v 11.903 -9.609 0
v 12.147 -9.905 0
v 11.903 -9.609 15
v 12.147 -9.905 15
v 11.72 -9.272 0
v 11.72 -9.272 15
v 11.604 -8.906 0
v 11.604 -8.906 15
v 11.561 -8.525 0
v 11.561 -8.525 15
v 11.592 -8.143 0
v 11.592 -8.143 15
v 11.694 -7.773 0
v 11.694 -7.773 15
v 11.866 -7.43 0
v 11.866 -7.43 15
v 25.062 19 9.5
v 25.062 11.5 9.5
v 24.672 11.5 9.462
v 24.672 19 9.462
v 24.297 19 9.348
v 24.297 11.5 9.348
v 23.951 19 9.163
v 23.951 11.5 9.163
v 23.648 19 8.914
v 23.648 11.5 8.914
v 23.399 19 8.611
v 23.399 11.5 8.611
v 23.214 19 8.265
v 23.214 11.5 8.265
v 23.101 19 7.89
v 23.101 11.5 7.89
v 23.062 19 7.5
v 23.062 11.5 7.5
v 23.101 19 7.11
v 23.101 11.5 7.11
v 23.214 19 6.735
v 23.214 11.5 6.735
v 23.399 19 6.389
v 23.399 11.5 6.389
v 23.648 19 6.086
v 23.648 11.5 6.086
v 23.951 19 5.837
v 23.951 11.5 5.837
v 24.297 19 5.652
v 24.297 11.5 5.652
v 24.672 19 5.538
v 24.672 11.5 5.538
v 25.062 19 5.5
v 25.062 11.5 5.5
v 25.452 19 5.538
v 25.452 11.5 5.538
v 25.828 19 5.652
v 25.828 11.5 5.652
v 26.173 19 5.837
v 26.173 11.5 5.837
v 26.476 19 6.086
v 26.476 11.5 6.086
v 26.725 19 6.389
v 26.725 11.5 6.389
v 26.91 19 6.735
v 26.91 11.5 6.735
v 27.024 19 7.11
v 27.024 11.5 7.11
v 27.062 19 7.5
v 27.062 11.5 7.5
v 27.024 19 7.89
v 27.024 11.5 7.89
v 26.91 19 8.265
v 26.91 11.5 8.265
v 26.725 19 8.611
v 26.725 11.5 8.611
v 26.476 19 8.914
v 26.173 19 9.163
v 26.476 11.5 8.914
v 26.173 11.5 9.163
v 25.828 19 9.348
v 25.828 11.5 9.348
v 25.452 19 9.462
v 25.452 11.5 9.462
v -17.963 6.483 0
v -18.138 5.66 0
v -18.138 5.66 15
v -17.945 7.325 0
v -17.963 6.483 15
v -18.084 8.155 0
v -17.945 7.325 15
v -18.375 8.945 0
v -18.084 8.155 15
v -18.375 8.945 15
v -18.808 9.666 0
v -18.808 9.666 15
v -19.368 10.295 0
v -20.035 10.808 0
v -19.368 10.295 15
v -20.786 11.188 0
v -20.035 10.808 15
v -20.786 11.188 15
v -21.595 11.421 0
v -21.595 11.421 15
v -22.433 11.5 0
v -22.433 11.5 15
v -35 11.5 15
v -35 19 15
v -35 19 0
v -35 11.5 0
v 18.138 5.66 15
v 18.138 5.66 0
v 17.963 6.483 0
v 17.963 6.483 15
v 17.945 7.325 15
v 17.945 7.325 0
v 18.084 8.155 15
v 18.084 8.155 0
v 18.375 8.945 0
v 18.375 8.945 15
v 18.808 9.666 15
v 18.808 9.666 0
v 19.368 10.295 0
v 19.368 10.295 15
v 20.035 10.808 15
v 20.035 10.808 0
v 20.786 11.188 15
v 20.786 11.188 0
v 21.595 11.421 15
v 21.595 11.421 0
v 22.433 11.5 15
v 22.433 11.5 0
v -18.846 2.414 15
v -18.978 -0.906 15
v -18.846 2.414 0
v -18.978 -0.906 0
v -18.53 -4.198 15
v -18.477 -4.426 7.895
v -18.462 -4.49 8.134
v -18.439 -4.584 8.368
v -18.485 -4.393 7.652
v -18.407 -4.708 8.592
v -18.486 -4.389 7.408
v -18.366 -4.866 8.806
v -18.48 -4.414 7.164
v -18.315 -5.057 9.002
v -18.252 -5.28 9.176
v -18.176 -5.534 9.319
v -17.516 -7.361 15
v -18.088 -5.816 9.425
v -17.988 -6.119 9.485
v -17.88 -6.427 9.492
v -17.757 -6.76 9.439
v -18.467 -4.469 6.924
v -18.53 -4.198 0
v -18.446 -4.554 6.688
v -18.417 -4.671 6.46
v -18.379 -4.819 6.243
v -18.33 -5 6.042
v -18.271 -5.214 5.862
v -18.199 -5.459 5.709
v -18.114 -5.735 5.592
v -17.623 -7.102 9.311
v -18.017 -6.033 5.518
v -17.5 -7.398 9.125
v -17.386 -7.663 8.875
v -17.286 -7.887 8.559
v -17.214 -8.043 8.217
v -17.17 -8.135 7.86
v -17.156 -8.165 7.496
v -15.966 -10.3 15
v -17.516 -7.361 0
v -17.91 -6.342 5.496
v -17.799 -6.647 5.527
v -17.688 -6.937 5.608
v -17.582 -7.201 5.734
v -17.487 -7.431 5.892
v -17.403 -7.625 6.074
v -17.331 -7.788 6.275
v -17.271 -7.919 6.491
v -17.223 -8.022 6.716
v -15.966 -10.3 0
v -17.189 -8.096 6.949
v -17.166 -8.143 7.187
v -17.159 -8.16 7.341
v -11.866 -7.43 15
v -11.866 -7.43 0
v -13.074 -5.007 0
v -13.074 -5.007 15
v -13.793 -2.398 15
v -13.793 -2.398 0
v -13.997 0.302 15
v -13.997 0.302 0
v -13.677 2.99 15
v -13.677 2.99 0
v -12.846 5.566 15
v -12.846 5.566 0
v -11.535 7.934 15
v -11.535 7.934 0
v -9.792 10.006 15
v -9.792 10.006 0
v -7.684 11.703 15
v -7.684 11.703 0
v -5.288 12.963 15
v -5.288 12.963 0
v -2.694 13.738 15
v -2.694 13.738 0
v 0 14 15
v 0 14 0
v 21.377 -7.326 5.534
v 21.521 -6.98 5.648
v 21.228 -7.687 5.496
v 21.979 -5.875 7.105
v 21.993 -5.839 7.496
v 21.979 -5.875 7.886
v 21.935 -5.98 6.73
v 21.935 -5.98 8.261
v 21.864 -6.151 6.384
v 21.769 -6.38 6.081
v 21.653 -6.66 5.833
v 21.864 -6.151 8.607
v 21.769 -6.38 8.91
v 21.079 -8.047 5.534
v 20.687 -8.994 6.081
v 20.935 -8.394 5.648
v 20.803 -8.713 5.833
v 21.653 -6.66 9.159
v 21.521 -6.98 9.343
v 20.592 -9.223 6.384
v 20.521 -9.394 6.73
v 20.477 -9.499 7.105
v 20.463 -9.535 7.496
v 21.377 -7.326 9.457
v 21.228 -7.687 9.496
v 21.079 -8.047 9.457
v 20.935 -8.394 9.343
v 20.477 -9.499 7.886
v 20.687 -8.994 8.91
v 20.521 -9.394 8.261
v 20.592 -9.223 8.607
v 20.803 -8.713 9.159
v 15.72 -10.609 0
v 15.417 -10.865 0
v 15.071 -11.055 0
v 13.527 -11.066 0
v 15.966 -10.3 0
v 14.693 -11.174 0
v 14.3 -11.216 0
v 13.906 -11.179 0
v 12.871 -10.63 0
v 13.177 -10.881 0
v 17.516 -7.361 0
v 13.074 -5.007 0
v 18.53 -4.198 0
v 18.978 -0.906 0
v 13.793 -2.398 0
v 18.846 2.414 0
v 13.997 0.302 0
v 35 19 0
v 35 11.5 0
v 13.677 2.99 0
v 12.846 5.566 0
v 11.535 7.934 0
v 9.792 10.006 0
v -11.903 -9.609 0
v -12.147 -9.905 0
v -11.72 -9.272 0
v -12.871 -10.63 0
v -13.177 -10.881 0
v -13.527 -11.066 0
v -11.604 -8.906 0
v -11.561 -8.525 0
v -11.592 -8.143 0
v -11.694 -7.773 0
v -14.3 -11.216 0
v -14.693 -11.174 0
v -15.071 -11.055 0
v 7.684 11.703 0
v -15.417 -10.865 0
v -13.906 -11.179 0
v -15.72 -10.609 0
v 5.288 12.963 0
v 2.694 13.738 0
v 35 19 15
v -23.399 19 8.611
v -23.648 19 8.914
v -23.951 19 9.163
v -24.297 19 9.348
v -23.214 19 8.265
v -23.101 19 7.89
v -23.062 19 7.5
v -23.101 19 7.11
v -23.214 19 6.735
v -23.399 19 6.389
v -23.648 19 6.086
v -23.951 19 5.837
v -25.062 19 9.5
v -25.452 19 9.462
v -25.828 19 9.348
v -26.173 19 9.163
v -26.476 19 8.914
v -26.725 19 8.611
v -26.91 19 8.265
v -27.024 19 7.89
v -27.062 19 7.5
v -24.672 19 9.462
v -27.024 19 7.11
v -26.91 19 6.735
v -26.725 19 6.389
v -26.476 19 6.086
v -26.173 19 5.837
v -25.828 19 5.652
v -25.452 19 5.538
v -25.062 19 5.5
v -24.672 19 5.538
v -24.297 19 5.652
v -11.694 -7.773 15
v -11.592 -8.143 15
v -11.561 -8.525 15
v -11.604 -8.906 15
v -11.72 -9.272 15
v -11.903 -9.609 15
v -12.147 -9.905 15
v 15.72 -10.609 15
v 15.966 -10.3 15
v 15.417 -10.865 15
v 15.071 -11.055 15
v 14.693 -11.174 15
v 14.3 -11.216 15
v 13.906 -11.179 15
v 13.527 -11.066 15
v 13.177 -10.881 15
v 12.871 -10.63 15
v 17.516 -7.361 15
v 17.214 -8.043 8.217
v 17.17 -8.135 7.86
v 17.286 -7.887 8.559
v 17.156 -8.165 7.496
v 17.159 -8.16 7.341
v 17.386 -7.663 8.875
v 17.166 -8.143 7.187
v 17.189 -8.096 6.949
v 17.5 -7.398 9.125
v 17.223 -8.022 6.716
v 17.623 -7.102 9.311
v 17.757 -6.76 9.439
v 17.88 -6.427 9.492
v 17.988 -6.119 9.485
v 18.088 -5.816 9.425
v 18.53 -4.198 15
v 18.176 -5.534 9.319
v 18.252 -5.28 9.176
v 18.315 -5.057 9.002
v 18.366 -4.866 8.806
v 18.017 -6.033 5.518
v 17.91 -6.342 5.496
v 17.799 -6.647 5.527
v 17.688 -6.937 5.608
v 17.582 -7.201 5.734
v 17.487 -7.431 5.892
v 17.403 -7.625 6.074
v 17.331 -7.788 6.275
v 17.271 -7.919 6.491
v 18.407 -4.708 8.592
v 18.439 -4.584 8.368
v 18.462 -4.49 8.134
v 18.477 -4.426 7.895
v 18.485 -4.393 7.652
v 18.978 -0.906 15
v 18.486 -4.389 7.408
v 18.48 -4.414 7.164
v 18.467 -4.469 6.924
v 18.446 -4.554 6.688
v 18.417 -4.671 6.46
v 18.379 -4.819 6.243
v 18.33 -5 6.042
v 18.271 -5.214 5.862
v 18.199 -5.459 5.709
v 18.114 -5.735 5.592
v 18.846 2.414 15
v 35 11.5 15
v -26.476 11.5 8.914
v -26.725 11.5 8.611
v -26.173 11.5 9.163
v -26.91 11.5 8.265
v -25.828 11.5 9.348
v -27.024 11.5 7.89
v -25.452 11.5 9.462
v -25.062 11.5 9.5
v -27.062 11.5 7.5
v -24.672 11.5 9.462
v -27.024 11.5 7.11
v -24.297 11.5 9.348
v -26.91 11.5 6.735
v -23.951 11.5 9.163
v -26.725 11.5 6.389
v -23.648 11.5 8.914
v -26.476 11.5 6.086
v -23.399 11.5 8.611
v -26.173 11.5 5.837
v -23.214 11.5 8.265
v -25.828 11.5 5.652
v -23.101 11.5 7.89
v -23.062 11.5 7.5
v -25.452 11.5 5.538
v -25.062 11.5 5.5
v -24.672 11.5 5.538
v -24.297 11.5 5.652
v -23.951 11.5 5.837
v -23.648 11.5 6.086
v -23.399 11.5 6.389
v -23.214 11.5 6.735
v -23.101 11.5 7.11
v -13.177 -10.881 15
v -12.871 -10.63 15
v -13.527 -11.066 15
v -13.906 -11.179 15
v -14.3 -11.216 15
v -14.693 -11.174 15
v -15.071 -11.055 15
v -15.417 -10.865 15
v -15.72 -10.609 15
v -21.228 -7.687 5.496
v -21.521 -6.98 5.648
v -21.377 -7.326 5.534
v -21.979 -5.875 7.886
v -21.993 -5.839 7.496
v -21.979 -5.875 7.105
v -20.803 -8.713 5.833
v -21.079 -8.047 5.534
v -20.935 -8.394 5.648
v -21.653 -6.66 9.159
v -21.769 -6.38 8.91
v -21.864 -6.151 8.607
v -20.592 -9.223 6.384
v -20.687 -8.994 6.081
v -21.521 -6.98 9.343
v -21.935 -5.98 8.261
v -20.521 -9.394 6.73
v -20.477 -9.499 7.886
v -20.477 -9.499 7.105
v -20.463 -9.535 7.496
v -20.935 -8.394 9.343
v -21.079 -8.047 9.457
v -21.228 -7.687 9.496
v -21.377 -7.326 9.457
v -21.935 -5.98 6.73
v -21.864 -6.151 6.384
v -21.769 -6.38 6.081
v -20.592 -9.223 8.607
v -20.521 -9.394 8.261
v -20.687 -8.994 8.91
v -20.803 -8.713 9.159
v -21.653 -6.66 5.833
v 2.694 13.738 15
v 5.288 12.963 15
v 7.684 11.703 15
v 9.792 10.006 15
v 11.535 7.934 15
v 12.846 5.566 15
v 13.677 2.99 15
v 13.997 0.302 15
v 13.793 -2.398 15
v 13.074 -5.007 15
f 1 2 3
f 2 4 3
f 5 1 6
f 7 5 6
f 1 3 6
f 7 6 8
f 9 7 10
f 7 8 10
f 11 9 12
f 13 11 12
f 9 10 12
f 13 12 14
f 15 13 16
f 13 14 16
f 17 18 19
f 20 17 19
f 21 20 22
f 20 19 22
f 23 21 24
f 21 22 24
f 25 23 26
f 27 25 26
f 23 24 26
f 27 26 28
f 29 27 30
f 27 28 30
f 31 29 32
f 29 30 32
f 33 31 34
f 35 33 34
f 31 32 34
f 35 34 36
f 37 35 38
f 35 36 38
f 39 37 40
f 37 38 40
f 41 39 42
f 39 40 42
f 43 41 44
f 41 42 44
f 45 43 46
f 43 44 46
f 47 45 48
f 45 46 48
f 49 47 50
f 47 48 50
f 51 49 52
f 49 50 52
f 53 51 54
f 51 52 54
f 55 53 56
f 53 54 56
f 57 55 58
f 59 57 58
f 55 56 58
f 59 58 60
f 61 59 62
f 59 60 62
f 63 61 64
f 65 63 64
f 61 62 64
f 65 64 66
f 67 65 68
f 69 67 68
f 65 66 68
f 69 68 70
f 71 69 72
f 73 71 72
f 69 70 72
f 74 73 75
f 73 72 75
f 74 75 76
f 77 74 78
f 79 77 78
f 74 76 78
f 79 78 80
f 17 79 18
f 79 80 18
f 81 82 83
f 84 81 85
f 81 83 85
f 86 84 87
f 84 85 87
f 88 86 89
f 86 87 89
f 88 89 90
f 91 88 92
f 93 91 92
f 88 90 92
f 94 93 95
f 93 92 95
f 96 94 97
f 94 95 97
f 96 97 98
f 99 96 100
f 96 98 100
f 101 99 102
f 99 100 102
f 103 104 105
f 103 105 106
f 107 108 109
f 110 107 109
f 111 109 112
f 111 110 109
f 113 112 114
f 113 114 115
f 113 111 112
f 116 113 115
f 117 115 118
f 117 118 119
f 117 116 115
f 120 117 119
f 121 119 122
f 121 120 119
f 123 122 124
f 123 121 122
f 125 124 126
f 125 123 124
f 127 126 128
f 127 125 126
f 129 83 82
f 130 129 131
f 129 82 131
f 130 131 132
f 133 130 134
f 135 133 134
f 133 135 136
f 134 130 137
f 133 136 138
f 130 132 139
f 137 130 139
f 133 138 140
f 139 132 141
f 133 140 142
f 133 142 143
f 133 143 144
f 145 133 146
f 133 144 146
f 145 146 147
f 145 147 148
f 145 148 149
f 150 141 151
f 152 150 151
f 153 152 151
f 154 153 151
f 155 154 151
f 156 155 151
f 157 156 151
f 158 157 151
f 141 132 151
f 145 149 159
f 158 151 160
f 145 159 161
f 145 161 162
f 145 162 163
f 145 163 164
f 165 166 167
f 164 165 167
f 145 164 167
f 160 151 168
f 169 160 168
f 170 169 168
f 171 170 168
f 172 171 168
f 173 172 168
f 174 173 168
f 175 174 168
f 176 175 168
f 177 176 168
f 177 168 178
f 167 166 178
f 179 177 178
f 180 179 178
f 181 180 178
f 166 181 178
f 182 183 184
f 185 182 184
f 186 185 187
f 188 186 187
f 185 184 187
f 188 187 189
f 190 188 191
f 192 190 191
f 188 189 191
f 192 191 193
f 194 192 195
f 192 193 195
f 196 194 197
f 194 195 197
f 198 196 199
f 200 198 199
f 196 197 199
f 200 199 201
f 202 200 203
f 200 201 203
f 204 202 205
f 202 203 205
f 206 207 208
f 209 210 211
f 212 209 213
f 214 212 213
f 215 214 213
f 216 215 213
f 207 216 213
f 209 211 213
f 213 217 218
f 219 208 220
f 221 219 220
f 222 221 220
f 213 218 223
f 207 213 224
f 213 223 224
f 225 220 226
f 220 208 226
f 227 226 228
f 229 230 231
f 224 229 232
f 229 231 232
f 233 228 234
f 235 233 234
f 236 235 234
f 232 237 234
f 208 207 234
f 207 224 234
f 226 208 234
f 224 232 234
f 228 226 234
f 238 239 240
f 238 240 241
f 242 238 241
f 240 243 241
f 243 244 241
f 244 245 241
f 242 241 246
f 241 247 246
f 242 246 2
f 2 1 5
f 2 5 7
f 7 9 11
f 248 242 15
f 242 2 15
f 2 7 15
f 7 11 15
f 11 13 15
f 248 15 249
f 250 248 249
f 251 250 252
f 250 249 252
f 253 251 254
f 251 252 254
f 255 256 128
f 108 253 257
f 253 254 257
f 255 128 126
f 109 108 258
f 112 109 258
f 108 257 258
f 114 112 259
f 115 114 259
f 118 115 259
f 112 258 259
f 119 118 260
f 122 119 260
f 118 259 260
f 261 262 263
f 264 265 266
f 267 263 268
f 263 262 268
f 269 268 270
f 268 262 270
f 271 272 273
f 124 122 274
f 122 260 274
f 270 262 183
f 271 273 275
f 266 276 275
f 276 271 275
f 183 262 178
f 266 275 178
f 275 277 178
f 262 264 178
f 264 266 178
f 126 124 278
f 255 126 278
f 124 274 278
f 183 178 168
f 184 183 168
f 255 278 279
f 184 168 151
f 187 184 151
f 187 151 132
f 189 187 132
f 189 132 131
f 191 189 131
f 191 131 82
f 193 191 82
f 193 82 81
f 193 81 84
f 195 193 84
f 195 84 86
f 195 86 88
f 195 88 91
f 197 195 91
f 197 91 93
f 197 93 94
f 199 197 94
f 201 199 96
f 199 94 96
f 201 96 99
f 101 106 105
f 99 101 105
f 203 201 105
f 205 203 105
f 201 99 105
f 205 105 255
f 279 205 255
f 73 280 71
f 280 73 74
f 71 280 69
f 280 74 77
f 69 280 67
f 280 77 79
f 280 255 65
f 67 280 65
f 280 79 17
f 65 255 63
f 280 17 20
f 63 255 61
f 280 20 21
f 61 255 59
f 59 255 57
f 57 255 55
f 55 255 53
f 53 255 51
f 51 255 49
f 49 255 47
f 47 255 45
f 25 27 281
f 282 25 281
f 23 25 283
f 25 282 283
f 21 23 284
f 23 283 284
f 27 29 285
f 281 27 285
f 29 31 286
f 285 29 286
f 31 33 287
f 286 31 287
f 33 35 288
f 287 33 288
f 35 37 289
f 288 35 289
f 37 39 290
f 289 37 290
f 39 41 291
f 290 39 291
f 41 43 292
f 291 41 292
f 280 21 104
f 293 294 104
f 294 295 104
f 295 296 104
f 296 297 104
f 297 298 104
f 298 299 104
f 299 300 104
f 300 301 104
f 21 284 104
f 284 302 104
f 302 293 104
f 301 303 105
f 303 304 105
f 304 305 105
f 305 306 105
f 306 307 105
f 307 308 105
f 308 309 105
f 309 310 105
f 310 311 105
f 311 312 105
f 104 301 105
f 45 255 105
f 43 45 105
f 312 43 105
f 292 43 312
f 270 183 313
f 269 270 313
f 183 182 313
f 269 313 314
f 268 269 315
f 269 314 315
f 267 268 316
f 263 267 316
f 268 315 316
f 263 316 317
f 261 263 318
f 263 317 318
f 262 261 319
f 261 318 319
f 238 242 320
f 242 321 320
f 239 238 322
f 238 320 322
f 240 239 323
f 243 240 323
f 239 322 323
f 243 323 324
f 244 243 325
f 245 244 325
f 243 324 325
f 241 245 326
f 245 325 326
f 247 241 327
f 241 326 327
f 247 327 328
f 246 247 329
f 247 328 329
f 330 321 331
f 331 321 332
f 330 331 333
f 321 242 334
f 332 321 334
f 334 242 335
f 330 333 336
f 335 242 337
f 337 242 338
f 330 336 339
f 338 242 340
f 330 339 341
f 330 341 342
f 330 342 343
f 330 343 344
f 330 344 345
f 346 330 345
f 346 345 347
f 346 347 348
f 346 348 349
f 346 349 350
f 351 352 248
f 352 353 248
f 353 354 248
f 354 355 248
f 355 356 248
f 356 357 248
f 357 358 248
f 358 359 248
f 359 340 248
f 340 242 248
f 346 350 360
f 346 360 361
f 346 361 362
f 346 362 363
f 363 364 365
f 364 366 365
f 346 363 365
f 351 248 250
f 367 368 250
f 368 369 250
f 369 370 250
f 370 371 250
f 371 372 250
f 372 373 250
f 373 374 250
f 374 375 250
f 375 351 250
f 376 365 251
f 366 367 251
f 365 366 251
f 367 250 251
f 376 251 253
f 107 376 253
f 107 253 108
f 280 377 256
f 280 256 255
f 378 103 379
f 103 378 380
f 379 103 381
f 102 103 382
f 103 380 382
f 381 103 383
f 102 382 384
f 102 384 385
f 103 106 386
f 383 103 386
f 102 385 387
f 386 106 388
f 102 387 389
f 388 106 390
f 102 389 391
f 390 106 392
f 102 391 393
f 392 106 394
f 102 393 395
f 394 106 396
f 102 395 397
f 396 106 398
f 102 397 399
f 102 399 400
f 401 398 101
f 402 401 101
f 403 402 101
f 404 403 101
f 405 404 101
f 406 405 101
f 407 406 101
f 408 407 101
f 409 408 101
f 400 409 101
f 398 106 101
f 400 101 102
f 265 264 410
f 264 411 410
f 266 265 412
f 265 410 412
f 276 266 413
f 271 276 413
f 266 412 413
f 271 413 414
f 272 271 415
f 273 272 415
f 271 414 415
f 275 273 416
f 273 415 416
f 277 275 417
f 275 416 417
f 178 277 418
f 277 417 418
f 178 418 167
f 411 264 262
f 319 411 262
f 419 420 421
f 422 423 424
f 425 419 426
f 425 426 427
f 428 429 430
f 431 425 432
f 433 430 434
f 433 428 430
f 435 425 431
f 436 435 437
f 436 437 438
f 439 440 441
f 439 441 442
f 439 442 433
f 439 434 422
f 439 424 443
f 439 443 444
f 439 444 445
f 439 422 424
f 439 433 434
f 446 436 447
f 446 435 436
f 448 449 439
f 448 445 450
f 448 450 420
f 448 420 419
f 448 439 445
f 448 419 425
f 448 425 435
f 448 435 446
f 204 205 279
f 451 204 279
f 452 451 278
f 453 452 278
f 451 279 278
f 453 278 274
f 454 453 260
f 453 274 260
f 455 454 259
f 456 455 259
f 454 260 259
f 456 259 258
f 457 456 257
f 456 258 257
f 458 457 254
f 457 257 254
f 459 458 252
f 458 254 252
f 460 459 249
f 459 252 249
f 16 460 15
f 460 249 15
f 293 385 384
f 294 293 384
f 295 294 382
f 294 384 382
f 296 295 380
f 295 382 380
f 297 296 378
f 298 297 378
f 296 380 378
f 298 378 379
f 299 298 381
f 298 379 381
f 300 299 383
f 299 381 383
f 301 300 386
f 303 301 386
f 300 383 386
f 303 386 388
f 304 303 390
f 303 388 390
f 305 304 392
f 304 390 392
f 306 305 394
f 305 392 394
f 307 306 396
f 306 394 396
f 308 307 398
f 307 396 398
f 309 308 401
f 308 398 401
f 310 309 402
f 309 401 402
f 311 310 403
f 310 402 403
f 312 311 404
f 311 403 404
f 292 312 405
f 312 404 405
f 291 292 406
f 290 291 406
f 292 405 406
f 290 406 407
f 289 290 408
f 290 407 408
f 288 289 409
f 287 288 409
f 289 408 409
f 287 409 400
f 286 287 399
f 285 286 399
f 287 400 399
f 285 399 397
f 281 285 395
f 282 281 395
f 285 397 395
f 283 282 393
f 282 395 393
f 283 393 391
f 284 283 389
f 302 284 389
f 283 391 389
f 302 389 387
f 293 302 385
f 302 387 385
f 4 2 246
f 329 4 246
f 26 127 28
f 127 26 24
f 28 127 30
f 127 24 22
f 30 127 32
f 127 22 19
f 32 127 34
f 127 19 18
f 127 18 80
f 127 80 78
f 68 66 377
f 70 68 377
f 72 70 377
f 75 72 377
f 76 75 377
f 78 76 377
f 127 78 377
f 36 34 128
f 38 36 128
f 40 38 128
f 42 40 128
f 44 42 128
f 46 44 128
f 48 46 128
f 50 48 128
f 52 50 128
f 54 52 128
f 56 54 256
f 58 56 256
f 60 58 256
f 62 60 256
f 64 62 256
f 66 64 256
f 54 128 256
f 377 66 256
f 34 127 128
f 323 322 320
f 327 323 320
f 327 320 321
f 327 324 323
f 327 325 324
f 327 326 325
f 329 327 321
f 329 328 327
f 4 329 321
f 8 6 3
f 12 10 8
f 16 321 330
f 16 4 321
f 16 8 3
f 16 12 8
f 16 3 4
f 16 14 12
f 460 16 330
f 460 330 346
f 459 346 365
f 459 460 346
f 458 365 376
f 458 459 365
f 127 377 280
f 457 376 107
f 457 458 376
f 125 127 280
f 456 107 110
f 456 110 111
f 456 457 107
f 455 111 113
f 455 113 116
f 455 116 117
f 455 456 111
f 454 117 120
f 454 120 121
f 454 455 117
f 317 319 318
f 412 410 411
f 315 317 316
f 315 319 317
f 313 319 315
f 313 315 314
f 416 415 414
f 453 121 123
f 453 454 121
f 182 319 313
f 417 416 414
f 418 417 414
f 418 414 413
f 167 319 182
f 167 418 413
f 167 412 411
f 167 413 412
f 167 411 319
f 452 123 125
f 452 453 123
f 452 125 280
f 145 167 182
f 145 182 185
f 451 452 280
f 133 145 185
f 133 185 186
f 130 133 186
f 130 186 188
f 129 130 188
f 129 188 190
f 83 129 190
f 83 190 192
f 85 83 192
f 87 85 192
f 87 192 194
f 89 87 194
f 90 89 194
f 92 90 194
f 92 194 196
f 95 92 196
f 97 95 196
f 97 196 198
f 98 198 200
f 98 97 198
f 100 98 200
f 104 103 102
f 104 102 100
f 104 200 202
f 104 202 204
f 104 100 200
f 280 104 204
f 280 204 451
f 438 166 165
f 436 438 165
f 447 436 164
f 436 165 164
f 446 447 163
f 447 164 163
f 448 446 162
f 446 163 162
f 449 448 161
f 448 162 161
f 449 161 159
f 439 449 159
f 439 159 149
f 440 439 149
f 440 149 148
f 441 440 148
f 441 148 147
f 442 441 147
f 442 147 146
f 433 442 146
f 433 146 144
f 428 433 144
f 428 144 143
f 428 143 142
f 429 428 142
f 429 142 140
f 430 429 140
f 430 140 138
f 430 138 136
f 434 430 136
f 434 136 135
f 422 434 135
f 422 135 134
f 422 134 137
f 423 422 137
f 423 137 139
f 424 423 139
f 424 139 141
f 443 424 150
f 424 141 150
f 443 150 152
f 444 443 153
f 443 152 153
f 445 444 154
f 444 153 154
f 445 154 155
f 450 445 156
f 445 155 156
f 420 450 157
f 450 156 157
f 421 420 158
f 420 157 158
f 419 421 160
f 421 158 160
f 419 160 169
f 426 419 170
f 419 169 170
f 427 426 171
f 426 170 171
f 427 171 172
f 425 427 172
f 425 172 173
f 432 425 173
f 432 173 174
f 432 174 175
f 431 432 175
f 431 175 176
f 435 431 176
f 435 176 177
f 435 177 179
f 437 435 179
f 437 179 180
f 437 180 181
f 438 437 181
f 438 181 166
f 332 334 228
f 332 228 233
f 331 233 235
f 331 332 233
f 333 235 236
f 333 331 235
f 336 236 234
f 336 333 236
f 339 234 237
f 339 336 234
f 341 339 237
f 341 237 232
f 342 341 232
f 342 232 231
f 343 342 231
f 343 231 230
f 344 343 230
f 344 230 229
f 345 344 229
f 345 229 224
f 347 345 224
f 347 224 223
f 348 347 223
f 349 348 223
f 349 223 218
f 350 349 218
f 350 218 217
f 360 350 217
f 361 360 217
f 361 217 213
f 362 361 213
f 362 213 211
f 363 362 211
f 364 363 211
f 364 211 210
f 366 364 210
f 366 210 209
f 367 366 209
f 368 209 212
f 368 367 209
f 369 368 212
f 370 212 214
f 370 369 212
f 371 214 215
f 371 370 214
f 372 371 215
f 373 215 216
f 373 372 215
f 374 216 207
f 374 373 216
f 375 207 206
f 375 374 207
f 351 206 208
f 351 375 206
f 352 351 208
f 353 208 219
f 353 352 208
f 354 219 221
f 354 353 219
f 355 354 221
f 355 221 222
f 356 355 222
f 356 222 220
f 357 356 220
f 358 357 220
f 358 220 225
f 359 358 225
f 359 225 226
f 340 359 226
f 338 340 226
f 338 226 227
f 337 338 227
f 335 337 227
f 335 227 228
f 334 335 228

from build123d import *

# Parameters (mm, degrees)
F1_DEPTH  = 15
F2_R      = 2
F3_DEPTH  = 7.5
F4_ANGLE  = 90
F5_R      = 4.5
F6_R      = 2
F10_R     = 2
F11_DEPTH = 5


# Not quite as in the source:
# - a pattern or mirror of a feature is missing from the dataset's text; its kind, count and spacing are read off the source's solid


with BuildPart() as f1:
    # F0 (on Right) → F1 (new body)
    with BuildSketch(Plane.YZ):
        with BuildLine():
            ThreePointArc((-8.7152049129, 10.9565141959), (6.0822336037, 12.6097753505), (14, 0))
            ThreePointArc((14, 0), (6.0822336037, -12.6097753505), (-8.7152049129, -10.9565141959))
            Line((-8.7152049129, -10.9565141959), (-12.2675540951, -14.5088633781))
            ThreePointArc((-12.2675540951, -14.5088633781), (-0.4919673203, -18.993629673), (11.5, -15.1244834623))
            ThreePointArc((11.5, -15.1244834623), (17.0220445305, -8.4409715081), (19, 0))
            ThreePointArc((19, 0), (17.0220445305, 8.4409715081), (11.5, 15.1244834623))
            ThreePointArc((11.5, 15.1244834623), (-0.4919673203, 18.993629673), (-12.2675540951, 14.5088633781))
            Line((-12.2675540951, 14.5088633781), (-8.7152049129, 10.9565141959))
        make_face()
        with BuildLine():
            Line((11.5, 35), (11.5, 15.1244834623))
            ThreePointArc((11.5, 15.1244834623), (17.0220445305, 8.4409715081), (19, 0))
            Line((19, 0), (19, 35))
            Line((19, 35), (11.5, 35))
        make_face()
        with BuildLine():
            ThreePointArc((19, 0), (17.0220445305, -8.4409715081), (11.5, -15.1244834623))
            Line((11.5, -15.1244834623), (11.5, -35))
            Line((11.5, -35), (19, -35))
            Line((19, -35), (19, 0))
        make_face()
    extrude(amount=F1_DEPTH)

    # F2 (on face) → F3 (cut, through all)
    with BuildSketch(Plane.XZ.offset(-11.5)):
        with Locations((7.5, 25.0622417311)):
            Circle(F2_R)
        with Locations((7.5, -25.0622417311)):
            Circle(F2_R)
    extrude(amount=-F3_DEPTH, mode=Mode.SUBTRACT)


with BuildPart() as f1_1:
    # F4: moved
    add(f1.part.rotate(Axis((0, -7, 0), (0, -1, 0)), F4_ANGLE))

    # F5
    f5_edges = [f1_1.edges().sort_by_distance(p)[0] for p in [
        (-15.124483, 11.5, 7.5),
        (15.124483, 11.5, 7.5),
    ]]
    fillet(f5_edges, radius=F5_R)

    # F6
    f6_edges = [f1_1.edges().sort_by_distance(p)[0] for p in [
        (10.956514, -8.715205, 7.5),
        (-10.956514, -8.715205, 7.5),
        (-14.508863, -12.267554, 7.5),
        (14.508863, -12.267554, 7.5),
    ]]
    fillet(f6_edges, radius=F6_R)

    # F10 (on line) → F11 (join)
    with BuildSketch(Plane(origin=(16.2175144213, -6.7175144213, 0), x_dir=(-0.3826834324, -0.9238795325, 0), z_dir=(-0.9238795325, 0.3826834324, 0))):
        with Locations((-1.0217712261, 7.4956147)):
            Circle(F10_R)
    f11 = extrude(amount=-F11_DEPTH)

    # F11_copies: F11 across plane
    add(f11.mirror(Plane(origin=(0, 0, 0), x_dir=(0, 0, -1), z_dir=(-1, 0, 0))))


solid = f1_1.part
